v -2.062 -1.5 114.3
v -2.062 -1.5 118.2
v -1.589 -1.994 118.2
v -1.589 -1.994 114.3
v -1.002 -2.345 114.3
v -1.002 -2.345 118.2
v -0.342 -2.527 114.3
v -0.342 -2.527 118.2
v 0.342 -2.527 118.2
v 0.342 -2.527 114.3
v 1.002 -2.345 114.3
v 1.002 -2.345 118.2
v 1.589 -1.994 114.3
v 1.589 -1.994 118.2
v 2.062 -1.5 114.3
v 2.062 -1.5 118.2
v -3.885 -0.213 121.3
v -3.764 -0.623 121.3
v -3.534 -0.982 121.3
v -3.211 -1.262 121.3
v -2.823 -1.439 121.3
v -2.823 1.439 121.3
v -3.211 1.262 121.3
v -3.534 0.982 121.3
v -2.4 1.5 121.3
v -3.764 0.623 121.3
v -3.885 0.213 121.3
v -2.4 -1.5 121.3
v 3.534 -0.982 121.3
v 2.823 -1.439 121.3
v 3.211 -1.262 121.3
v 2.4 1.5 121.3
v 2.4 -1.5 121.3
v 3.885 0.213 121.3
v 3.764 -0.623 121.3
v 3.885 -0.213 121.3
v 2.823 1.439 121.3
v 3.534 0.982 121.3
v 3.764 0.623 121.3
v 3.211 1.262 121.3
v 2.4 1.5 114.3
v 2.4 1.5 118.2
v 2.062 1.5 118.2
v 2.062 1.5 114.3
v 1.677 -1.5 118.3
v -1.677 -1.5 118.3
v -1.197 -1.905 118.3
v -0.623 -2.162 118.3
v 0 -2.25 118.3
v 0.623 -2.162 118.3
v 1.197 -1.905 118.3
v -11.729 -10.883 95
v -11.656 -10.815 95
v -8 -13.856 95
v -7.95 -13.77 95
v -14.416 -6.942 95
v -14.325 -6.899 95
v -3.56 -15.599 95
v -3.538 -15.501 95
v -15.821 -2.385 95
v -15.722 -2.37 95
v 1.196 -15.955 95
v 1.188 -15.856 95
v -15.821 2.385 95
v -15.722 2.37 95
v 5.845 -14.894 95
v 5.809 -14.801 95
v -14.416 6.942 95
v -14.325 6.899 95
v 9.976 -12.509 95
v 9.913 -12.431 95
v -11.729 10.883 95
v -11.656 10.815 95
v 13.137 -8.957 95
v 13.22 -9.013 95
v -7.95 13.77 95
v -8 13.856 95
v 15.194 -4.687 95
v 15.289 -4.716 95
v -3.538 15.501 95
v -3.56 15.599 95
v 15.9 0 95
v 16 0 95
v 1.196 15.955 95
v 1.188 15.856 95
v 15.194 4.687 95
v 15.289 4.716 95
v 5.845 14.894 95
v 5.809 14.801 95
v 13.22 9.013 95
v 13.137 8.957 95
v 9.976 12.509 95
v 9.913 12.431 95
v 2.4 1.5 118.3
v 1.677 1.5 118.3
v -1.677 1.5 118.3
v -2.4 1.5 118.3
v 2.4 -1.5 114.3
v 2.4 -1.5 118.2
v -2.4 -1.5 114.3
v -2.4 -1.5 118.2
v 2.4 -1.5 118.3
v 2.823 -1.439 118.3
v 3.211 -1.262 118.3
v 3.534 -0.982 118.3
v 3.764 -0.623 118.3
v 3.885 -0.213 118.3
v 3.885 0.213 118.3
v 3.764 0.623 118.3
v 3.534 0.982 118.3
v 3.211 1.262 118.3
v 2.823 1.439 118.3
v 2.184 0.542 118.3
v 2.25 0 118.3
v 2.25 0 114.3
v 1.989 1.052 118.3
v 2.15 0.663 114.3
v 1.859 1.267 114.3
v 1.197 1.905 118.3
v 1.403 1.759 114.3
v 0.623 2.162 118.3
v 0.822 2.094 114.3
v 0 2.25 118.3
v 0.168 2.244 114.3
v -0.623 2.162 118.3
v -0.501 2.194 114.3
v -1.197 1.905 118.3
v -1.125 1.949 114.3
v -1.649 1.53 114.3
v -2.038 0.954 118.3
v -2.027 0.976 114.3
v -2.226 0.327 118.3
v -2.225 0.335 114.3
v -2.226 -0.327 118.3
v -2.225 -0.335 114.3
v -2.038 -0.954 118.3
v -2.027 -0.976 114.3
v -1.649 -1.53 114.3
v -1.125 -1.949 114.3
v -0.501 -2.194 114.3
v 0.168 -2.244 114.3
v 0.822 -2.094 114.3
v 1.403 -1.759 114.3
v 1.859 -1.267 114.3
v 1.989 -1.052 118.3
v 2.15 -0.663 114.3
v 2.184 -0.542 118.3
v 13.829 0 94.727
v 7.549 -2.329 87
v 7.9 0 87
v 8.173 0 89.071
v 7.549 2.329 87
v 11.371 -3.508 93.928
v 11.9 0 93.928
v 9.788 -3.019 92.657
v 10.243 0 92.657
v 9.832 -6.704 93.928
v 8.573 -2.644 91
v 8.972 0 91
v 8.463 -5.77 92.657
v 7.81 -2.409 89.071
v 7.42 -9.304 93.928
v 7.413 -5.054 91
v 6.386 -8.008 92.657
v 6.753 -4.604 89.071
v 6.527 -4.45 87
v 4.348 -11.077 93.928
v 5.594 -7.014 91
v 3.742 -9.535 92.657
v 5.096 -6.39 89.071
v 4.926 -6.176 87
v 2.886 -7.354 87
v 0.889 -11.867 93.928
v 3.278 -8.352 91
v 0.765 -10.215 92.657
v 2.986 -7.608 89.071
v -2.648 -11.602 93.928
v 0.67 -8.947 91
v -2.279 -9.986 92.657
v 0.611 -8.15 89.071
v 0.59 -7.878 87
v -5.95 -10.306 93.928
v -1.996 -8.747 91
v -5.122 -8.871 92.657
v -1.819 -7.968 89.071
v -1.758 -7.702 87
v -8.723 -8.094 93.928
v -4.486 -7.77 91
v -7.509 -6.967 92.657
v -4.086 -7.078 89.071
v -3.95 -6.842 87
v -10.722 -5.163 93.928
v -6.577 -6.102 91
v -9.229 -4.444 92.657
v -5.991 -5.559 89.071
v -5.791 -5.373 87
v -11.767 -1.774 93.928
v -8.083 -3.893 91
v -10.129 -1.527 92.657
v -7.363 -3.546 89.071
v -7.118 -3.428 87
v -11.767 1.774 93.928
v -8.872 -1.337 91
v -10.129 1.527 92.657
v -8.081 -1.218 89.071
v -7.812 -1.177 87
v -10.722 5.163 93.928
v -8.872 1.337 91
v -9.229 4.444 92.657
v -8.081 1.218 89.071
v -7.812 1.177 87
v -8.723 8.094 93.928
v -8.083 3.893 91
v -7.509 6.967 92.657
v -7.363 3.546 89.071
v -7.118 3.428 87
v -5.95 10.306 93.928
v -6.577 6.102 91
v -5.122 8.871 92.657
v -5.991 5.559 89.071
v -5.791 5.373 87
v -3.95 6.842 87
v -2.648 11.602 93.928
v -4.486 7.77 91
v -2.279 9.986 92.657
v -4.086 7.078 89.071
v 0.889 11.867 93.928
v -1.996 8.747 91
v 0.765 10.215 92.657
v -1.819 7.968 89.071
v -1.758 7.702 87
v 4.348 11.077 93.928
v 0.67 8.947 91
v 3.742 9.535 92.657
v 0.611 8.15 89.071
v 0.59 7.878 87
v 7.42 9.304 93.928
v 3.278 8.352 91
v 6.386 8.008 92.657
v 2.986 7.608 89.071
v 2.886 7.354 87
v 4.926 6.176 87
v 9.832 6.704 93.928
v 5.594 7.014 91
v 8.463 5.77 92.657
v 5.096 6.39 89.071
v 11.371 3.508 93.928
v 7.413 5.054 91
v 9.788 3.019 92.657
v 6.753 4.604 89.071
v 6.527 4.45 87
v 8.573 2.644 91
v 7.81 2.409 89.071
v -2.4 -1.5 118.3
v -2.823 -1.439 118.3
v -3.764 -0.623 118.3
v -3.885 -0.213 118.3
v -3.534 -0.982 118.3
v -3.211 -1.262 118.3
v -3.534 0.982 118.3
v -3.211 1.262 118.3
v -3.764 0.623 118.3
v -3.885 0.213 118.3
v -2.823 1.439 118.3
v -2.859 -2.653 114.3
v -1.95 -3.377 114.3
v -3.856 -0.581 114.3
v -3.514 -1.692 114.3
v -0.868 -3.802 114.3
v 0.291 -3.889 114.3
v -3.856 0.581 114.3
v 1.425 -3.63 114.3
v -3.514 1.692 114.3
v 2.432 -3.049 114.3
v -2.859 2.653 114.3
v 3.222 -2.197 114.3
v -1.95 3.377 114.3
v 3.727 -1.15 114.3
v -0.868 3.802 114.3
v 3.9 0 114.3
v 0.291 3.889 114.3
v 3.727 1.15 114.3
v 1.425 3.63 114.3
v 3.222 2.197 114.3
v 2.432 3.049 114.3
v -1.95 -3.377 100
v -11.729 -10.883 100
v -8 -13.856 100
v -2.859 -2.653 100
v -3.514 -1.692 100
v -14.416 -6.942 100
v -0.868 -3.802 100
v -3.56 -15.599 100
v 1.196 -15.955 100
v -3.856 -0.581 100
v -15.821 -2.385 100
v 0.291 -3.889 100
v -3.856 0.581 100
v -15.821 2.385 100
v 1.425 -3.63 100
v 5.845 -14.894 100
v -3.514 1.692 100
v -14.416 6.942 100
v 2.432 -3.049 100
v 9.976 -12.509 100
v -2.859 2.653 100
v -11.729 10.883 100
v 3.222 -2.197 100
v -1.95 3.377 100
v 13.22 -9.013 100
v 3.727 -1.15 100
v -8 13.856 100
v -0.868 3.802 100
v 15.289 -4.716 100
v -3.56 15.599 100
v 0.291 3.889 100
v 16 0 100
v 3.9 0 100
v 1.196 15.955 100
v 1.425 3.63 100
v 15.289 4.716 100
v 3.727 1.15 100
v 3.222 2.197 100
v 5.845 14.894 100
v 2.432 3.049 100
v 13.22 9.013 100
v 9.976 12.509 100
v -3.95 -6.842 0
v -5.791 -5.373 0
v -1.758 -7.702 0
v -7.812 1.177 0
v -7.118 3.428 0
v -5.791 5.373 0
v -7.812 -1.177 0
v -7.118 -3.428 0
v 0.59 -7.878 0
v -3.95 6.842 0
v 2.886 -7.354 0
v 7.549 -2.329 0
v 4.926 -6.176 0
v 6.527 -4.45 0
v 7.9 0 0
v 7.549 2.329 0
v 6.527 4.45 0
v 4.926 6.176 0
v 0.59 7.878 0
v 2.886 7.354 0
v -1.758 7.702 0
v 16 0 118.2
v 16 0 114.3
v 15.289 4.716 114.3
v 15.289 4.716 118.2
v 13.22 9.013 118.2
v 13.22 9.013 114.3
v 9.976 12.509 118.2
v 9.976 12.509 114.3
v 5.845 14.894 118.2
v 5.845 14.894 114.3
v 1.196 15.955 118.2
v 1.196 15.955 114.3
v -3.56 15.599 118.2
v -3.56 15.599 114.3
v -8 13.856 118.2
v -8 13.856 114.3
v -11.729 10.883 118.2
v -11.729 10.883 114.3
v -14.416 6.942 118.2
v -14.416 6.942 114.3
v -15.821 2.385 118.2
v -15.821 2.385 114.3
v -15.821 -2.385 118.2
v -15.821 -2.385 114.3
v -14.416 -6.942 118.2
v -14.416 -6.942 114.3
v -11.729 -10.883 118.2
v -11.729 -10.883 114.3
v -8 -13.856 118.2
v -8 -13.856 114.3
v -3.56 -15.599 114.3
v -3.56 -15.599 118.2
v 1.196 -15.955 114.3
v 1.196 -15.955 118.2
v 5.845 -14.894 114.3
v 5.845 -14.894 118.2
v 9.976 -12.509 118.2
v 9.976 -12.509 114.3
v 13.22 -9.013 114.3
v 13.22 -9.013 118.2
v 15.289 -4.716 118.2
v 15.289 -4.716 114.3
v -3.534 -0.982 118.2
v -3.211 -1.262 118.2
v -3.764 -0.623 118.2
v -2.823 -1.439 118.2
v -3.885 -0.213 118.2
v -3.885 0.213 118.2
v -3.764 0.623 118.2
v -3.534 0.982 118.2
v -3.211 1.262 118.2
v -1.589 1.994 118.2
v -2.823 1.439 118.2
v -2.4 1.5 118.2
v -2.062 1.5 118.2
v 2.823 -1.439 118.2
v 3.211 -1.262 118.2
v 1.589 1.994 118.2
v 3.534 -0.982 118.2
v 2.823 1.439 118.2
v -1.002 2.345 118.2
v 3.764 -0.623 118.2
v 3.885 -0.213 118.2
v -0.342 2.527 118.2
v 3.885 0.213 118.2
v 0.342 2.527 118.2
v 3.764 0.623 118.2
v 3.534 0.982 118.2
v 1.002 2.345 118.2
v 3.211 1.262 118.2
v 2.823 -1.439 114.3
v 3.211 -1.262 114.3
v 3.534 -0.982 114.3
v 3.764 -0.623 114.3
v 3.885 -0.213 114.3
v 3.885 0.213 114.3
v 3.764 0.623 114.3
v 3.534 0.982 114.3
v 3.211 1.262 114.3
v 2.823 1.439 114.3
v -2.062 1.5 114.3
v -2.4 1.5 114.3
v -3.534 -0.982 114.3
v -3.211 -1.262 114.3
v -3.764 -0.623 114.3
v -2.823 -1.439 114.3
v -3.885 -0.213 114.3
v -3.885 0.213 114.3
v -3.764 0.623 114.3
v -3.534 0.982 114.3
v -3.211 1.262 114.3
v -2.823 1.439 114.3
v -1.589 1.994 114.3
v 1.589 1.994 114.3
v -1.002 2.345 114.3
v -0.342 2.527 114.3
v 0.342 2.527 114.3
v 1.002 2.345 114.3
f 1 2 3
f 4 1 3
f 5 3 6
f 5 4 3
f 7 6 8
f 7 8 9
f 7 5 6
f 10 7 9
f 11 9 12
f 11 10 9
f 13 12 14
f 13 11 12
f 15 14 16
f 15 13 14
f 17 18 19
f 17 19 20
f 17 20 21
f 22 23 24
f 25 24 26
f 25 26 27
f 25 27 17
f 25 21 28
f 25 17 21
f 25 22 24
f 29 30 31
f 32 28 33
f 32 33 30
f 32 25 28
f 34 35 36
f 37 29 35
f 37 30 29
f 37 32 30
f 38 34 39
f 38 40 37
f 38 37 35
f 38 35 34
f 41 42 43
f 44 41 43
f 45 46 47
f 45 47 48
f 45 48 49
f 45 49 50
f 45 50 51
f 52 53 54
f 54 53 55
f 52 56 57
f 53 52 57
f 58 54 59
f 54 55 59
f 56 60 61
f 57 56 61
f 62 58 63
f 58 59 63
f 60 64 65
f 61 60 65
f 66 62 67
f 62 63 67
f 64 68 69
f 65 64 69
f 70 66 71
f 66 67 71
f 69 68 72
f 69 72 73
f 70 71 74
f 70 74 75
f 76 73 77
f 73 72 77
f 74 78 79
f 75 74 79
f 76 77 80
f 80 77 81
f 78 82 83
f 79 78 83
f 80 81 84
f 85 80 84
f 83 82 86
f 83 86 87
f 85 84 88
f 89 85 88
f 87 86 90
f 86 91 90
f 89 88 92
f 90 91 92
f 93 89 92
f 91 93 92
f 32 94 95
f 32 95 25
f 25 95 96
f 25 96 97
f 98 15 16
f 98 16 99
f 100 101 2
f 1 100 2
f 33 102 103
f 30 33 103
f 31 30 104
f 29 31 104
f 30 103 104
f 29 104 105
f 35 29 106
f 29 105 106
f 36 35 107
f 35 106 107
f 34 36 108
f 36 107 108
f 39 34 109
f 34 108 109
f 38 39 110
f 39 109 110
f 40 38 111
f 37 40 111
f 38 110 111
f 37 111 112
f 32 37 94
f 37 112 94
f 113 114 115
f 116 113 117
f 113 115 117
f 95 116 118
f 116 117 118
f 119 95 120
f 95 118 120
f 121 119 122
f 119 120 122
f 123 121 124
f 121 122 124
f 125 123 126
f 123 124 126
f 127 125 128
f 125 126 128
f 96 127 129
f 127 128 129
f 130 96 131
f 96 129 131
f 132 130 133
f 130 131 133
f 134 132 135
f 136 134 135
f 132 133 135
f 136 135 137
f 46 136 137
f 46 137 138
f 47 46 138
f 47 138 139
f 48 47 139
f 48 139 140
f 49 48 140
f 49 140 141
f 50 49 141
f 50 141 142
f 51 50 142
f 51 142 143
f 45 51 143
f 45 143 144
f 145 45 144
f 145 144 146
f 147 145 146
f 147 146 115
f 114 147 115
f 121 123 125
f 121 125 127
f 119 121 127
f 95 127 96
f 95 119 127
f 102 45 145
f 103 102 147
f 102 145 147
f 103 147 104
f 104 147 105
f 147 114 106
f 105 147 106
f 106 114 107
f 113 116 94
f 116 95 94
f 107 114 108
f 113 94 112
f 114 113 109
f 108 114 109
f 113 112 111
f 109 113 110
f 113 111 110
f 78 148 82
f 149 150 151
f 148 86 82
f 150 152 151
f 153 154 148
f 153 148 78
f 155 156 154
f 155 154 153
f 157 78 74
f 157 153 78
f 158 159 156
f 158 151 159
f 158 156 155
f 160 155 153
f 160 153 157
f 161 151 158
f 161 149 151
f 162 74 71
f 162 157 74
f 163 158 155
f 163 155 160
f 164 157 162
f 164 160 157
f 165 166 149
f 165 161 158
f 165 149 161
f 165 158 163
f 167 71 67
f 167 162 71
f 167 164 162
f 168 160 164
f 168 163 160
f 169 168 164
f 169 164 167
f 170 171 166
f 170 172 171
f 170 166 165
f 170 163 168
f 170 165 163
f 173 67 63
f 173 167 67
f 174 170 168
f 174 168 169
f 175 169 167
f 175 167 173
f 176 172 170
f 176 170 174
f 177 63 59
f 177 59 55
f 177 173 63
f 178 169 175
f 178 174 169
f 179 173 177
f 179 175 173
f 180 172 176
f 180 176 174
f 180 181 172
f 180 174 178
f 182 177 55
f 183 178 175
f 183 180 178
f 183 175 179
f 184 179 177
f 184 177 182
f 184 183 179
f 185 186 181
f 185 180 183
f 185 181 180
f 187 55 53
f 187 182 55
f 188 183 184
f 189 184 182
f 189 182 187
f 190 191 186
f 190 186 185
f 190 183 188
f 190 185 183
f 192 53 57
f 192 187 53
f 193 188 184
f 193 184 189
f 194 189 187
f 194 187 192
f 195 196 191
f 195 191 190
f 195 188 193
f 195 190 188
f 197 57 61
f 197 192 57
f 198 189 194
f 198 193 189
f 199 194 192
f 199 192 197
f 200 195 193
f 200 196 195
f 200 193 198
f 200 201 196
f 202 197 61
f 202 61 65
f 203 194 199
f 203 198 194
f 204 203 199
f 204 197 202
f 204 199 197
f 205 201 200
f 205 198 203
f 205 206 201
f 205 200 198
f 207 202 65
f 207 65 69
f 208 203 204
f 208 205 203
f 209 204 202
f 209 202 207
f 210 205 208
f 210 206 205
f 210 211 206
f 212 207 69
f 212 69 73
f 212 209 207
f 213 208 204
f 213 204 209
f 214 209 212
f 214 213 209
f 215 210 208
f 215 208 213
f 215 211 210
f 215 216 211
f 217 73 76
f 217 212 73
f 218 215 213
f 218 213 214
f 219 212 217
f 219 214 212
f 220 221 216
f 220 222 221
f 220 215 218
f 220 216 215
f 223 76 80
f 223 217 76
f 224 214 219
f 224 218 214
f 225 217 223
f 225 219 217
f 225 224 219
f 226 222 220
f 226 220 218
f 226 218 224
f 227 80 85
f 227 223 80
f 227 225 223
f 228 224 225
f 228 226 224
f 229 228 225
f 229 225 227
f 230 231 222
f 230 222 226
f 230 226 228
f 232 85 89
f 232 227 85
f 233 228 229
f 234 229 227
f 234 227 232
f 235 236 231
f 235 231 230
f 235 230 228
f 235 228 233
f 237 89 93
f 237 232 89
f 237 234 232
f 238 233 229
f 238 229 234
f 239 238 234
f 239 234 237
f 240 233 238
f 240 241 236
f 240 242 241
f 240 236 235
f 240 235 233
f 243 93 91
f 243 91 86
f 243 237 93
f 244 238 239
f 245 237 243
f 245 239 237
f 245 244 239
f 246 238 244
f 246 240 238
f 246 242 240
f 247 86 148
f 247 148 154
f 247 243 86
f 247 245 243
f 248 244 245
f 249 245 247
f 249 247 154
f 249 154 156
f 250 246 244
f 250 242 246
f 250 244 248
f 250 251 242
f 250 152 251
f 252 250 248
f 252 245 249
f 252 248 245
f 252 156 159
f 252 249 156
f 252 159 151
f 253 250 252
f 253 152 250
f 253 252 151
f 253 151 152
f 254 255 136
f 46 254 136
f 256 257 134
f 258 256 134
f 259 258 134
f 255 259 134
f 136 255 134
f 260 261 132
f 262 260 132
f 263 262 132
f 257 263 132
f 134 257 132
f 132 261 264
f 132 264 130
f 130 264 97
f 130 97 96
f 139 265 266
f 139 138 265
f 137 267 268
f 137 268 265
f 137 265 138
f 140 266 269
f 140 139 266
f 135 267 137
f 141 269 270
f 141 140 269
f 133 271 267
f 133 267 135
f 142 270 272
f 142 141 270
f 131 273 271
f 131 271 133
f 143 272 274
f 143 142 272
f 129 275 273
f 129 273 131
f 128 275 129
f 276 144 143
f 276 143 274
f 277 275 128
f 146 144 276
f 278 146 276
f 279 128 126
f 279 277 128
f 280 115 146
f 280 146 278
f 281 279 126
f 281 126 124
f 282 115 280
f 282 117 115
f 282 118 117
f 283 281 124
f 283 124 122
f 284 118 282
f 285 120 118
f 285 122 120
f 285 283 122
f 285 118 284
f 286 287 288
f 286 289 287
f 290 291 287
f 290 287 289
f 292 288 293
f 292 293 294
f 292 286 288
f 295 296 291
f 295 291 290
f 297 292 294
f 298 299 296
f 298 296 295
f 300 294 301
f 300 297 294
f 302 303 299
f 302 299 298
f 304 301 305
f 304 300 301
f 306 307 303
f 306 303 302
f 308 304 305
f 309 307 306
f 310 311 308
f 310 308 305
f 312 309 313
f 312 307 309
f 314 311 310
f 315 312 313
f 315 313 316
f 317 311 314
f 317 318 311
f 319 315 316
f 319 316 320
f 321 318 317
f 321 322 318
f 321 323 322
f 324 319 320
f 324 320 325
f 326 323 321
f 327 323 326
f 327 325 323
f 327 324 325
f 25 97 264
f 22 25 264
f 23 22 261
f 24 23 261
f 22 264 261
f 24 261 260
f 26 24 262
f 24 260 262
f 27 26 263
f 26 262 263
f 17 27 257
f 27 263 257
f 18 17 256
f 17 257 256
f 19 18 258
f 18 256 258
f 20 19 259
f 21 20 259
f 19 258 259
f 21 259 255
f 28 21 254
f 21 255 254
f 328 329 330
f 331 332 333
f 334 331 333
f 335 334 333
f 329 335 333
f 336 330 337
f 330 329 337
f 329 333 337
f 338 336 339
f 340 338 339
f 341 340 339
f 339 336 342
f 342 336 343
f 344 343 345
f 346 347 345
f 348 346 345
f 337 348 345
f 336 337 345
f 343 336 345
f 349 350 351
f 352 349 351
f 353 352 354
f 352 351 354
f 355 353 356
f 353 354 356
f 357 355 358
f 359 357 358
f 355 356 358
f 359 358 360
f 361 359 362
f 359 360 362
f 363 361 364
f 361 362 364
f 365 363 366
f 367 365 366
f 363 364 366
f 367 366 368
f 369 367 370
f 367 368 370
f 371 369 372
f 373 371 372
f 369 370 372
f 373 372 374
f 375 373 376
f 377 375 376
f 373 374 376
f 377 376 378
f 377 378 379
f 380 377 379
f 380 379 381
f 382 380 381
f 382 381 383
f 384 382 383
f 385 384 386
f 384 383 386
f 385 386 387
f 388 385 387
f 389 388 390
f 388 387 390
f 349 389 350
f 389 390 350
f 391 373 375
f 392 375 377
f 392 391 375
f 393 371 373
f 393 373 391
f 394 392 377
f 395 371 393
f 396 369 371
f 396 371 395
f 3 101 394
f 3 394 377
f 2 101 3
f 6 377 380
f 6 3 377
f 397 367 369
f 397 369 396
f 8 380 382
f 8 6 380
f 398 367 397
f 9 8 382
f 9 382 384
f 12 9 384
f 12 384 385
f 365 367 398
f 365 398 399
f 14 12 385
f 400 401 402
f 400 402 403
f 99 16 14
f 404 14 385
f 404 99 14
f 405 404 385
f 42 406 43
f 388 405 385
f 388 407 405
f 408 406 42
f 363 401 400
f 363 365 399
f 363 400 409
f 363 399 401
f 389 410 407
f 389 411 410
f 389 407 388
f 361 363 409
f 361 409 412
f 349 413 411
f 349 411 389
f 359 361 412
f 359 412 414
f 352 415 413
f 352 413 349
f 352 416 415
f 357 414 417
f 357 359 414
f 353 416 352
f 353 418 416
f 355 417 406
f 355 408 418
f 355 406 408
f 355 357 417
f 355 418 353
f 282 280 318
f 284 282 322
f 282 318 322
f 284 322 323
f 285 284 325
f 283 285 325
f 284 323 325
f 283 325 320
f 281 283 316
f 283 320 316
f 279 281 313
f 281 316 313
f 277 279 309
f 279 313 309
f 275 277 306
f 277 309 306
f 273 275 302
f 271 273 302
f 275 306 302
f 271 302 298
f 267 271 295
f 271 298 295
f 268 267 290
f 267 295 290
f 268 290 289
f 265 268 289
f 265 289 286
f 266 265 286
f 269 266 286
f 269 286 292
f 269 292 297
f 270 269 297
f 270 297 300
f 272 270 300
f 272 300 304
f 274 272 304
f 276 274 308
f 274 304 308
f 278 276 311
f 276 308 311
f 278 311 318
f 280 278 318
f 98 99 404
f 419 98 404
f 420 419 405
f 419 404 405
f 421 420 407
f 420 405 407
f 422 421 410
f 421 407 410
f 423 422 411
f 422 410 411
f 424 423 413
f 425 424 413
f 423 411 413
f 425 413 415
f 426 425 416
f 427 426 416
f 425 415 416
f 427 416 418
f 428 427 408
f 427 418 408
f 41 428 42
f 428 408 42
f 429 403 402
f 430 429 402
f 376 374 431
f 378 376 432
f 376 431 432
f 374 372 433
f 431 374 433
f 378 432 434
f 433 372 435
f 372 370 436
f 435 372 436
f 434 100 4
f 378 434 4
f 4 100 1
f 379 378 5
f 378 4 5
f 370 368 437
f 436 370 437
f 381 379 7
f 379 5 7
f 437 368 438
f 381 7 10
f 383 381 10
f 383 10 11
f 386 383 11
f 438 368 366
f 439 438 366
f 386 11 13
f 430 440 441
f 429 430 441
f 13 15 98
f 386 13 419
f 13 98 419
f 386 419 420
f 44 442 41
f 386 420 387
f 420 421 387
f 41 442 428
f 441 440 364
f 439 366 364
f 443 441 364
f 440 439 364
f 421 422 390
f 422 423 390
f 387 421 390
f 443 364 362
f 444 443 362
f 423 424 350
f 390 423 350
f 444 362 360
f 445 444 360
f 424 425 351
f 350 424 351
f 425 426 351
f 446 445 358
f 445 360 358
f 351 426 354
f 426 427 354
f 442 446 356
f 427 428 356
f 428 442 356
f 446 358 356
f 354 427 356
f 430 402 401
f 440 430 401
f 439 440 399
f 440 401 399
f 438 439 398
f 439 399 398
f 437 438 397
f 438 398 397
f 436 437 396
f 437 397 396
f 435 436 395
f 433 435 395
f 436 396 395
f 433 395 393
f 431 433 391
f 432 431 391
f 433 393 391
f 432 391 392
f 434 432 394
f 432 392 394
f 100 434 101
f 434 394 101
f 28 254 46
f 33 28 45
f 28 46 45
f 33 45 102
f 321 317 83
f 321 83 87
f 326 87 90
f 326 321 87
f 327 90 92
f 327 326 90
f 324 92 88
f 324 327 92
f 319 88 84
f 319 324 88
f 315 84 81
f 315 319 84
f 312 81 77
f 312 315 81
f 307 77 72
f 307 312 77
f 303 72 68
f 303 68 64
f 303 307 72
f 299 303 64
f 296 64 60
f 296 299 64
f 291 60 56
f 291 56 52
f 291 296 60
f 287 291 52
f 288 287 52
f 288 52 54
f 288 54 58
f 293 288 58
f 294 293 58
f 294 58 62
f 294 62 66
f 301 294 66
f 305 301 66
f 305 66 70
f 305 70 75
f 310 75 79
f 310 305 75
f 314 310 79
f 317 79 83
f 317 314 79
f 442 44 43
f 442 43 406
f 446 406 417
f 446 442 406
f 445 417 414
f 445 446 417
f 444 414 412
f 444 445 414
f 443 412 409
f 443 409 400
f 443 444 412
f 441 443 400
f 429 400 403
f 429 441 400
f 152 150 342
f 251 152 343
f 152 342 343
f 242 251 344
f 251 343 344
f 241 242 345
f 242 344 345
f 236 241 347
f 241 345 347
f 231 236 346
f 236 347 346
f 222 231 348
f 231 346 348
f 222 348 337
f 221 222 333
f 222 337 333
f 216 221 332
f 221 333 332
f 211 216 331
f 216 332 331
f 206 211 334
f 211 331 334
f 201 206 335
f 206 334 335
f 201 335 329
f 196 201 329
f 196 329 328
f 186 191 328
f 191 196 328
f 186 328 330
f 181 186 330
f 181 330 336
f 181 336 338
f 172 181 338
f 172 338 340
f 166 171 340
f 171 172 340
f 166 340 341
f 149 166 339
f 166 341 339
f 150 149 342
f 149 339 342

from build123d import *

# Parameters (mm, degrees)
F0_R      = 7.9
F1_DEPTH  = 100
F2_R      = 3.9
F3_DEPTH  = 14.3
F4_R      = 2.25
F5_DEPTH  = 4
F7_DEPTH  = 3
F8_R      = 16
F8_R_2    = 2.55
F9_DEPTH  = 3.9
F11_DEPTH = 3.9
F12_R     = 16
F13_DEPTH = 5
F14_R     = 8


with BuildPart() as f1:
    # F0 (on Top) → F1 (new body)
    with BuildSketch(Plane.XY):
        Circle(F0_R)
    extrude(amount=F1_DEPTH)

    # F2 (on face) → F3 (join)
    with BuildSketch(Plane.XY.offset(100)):
        Circle(F2_R)
    extrude(amount=F3_DEPTH)

    # F4 (on face) → F5 (join)
    with BuildSketch(Plane.XY.offset(114.3)):
        Circle(F4_R)
    extrude(amount=F5_DEPTH)

    # F6 (on face) → F7 (join)
    with BuildSketch(Plane.XY.offset(118.3)):
        with BuildLine():
            ThreePointArc((-2.4, 1.5), (-3.9, 0), (-2.4, -1.5))
            Line((-2.4, -1.5), (2.4, -1.5))
            ThreePointArc((2.4, -1.5), (3.9, 0), (2.4, 1.5))
            Line((2.4, 1.5), (-2.4, 1.5))
        make_face()
    extrude(amount=F7_DEPTH)

    # F12 (on face) → F13 (join)
    with BuildSketch(Plane.XY.offset(100)):
        Circle(F12_R)
    extrude(amount=-F13_DEPTH)

    # F14
    f14_edges = [f1.edges().sort_by_distance(p)[0] for p in [
        (-7.9, 0, 95),
    ]]
    fillet(f14_edges, radius=F14_R)


with BuildPart() as f9:
    # F8 (on face) → F9 (new body)
    with BuildSketch(Plane.XY.offset(114.3)):
        Circle(F8_R)
        Circle(F8_R_2, mode=Mode.SUBTRACT)
    extrude(amount=F9_DEPTH)

    # F10 (on face) → F11 (cut, through all)
    with BuildSketch(Plane.XY.offset(118.2)):
        with BuildLine():
            Line((2.4, 1.5), (-2.4, 1.5))
            ThreePointArc((-2.4, 1.5), (-3.9, 0), (-2.4, -1.5))
            Line((-2.4, -1.5), (2.4, -1.5))
            ThreePointArc((2.4, -1.5), (3.9, 0), (2.4, 1.5))
        make_face()
    extrude(amount=-F11_DEPTH, mode=Mode.SUBTRACT)


solid = Compound([f1.part, f9.part])
